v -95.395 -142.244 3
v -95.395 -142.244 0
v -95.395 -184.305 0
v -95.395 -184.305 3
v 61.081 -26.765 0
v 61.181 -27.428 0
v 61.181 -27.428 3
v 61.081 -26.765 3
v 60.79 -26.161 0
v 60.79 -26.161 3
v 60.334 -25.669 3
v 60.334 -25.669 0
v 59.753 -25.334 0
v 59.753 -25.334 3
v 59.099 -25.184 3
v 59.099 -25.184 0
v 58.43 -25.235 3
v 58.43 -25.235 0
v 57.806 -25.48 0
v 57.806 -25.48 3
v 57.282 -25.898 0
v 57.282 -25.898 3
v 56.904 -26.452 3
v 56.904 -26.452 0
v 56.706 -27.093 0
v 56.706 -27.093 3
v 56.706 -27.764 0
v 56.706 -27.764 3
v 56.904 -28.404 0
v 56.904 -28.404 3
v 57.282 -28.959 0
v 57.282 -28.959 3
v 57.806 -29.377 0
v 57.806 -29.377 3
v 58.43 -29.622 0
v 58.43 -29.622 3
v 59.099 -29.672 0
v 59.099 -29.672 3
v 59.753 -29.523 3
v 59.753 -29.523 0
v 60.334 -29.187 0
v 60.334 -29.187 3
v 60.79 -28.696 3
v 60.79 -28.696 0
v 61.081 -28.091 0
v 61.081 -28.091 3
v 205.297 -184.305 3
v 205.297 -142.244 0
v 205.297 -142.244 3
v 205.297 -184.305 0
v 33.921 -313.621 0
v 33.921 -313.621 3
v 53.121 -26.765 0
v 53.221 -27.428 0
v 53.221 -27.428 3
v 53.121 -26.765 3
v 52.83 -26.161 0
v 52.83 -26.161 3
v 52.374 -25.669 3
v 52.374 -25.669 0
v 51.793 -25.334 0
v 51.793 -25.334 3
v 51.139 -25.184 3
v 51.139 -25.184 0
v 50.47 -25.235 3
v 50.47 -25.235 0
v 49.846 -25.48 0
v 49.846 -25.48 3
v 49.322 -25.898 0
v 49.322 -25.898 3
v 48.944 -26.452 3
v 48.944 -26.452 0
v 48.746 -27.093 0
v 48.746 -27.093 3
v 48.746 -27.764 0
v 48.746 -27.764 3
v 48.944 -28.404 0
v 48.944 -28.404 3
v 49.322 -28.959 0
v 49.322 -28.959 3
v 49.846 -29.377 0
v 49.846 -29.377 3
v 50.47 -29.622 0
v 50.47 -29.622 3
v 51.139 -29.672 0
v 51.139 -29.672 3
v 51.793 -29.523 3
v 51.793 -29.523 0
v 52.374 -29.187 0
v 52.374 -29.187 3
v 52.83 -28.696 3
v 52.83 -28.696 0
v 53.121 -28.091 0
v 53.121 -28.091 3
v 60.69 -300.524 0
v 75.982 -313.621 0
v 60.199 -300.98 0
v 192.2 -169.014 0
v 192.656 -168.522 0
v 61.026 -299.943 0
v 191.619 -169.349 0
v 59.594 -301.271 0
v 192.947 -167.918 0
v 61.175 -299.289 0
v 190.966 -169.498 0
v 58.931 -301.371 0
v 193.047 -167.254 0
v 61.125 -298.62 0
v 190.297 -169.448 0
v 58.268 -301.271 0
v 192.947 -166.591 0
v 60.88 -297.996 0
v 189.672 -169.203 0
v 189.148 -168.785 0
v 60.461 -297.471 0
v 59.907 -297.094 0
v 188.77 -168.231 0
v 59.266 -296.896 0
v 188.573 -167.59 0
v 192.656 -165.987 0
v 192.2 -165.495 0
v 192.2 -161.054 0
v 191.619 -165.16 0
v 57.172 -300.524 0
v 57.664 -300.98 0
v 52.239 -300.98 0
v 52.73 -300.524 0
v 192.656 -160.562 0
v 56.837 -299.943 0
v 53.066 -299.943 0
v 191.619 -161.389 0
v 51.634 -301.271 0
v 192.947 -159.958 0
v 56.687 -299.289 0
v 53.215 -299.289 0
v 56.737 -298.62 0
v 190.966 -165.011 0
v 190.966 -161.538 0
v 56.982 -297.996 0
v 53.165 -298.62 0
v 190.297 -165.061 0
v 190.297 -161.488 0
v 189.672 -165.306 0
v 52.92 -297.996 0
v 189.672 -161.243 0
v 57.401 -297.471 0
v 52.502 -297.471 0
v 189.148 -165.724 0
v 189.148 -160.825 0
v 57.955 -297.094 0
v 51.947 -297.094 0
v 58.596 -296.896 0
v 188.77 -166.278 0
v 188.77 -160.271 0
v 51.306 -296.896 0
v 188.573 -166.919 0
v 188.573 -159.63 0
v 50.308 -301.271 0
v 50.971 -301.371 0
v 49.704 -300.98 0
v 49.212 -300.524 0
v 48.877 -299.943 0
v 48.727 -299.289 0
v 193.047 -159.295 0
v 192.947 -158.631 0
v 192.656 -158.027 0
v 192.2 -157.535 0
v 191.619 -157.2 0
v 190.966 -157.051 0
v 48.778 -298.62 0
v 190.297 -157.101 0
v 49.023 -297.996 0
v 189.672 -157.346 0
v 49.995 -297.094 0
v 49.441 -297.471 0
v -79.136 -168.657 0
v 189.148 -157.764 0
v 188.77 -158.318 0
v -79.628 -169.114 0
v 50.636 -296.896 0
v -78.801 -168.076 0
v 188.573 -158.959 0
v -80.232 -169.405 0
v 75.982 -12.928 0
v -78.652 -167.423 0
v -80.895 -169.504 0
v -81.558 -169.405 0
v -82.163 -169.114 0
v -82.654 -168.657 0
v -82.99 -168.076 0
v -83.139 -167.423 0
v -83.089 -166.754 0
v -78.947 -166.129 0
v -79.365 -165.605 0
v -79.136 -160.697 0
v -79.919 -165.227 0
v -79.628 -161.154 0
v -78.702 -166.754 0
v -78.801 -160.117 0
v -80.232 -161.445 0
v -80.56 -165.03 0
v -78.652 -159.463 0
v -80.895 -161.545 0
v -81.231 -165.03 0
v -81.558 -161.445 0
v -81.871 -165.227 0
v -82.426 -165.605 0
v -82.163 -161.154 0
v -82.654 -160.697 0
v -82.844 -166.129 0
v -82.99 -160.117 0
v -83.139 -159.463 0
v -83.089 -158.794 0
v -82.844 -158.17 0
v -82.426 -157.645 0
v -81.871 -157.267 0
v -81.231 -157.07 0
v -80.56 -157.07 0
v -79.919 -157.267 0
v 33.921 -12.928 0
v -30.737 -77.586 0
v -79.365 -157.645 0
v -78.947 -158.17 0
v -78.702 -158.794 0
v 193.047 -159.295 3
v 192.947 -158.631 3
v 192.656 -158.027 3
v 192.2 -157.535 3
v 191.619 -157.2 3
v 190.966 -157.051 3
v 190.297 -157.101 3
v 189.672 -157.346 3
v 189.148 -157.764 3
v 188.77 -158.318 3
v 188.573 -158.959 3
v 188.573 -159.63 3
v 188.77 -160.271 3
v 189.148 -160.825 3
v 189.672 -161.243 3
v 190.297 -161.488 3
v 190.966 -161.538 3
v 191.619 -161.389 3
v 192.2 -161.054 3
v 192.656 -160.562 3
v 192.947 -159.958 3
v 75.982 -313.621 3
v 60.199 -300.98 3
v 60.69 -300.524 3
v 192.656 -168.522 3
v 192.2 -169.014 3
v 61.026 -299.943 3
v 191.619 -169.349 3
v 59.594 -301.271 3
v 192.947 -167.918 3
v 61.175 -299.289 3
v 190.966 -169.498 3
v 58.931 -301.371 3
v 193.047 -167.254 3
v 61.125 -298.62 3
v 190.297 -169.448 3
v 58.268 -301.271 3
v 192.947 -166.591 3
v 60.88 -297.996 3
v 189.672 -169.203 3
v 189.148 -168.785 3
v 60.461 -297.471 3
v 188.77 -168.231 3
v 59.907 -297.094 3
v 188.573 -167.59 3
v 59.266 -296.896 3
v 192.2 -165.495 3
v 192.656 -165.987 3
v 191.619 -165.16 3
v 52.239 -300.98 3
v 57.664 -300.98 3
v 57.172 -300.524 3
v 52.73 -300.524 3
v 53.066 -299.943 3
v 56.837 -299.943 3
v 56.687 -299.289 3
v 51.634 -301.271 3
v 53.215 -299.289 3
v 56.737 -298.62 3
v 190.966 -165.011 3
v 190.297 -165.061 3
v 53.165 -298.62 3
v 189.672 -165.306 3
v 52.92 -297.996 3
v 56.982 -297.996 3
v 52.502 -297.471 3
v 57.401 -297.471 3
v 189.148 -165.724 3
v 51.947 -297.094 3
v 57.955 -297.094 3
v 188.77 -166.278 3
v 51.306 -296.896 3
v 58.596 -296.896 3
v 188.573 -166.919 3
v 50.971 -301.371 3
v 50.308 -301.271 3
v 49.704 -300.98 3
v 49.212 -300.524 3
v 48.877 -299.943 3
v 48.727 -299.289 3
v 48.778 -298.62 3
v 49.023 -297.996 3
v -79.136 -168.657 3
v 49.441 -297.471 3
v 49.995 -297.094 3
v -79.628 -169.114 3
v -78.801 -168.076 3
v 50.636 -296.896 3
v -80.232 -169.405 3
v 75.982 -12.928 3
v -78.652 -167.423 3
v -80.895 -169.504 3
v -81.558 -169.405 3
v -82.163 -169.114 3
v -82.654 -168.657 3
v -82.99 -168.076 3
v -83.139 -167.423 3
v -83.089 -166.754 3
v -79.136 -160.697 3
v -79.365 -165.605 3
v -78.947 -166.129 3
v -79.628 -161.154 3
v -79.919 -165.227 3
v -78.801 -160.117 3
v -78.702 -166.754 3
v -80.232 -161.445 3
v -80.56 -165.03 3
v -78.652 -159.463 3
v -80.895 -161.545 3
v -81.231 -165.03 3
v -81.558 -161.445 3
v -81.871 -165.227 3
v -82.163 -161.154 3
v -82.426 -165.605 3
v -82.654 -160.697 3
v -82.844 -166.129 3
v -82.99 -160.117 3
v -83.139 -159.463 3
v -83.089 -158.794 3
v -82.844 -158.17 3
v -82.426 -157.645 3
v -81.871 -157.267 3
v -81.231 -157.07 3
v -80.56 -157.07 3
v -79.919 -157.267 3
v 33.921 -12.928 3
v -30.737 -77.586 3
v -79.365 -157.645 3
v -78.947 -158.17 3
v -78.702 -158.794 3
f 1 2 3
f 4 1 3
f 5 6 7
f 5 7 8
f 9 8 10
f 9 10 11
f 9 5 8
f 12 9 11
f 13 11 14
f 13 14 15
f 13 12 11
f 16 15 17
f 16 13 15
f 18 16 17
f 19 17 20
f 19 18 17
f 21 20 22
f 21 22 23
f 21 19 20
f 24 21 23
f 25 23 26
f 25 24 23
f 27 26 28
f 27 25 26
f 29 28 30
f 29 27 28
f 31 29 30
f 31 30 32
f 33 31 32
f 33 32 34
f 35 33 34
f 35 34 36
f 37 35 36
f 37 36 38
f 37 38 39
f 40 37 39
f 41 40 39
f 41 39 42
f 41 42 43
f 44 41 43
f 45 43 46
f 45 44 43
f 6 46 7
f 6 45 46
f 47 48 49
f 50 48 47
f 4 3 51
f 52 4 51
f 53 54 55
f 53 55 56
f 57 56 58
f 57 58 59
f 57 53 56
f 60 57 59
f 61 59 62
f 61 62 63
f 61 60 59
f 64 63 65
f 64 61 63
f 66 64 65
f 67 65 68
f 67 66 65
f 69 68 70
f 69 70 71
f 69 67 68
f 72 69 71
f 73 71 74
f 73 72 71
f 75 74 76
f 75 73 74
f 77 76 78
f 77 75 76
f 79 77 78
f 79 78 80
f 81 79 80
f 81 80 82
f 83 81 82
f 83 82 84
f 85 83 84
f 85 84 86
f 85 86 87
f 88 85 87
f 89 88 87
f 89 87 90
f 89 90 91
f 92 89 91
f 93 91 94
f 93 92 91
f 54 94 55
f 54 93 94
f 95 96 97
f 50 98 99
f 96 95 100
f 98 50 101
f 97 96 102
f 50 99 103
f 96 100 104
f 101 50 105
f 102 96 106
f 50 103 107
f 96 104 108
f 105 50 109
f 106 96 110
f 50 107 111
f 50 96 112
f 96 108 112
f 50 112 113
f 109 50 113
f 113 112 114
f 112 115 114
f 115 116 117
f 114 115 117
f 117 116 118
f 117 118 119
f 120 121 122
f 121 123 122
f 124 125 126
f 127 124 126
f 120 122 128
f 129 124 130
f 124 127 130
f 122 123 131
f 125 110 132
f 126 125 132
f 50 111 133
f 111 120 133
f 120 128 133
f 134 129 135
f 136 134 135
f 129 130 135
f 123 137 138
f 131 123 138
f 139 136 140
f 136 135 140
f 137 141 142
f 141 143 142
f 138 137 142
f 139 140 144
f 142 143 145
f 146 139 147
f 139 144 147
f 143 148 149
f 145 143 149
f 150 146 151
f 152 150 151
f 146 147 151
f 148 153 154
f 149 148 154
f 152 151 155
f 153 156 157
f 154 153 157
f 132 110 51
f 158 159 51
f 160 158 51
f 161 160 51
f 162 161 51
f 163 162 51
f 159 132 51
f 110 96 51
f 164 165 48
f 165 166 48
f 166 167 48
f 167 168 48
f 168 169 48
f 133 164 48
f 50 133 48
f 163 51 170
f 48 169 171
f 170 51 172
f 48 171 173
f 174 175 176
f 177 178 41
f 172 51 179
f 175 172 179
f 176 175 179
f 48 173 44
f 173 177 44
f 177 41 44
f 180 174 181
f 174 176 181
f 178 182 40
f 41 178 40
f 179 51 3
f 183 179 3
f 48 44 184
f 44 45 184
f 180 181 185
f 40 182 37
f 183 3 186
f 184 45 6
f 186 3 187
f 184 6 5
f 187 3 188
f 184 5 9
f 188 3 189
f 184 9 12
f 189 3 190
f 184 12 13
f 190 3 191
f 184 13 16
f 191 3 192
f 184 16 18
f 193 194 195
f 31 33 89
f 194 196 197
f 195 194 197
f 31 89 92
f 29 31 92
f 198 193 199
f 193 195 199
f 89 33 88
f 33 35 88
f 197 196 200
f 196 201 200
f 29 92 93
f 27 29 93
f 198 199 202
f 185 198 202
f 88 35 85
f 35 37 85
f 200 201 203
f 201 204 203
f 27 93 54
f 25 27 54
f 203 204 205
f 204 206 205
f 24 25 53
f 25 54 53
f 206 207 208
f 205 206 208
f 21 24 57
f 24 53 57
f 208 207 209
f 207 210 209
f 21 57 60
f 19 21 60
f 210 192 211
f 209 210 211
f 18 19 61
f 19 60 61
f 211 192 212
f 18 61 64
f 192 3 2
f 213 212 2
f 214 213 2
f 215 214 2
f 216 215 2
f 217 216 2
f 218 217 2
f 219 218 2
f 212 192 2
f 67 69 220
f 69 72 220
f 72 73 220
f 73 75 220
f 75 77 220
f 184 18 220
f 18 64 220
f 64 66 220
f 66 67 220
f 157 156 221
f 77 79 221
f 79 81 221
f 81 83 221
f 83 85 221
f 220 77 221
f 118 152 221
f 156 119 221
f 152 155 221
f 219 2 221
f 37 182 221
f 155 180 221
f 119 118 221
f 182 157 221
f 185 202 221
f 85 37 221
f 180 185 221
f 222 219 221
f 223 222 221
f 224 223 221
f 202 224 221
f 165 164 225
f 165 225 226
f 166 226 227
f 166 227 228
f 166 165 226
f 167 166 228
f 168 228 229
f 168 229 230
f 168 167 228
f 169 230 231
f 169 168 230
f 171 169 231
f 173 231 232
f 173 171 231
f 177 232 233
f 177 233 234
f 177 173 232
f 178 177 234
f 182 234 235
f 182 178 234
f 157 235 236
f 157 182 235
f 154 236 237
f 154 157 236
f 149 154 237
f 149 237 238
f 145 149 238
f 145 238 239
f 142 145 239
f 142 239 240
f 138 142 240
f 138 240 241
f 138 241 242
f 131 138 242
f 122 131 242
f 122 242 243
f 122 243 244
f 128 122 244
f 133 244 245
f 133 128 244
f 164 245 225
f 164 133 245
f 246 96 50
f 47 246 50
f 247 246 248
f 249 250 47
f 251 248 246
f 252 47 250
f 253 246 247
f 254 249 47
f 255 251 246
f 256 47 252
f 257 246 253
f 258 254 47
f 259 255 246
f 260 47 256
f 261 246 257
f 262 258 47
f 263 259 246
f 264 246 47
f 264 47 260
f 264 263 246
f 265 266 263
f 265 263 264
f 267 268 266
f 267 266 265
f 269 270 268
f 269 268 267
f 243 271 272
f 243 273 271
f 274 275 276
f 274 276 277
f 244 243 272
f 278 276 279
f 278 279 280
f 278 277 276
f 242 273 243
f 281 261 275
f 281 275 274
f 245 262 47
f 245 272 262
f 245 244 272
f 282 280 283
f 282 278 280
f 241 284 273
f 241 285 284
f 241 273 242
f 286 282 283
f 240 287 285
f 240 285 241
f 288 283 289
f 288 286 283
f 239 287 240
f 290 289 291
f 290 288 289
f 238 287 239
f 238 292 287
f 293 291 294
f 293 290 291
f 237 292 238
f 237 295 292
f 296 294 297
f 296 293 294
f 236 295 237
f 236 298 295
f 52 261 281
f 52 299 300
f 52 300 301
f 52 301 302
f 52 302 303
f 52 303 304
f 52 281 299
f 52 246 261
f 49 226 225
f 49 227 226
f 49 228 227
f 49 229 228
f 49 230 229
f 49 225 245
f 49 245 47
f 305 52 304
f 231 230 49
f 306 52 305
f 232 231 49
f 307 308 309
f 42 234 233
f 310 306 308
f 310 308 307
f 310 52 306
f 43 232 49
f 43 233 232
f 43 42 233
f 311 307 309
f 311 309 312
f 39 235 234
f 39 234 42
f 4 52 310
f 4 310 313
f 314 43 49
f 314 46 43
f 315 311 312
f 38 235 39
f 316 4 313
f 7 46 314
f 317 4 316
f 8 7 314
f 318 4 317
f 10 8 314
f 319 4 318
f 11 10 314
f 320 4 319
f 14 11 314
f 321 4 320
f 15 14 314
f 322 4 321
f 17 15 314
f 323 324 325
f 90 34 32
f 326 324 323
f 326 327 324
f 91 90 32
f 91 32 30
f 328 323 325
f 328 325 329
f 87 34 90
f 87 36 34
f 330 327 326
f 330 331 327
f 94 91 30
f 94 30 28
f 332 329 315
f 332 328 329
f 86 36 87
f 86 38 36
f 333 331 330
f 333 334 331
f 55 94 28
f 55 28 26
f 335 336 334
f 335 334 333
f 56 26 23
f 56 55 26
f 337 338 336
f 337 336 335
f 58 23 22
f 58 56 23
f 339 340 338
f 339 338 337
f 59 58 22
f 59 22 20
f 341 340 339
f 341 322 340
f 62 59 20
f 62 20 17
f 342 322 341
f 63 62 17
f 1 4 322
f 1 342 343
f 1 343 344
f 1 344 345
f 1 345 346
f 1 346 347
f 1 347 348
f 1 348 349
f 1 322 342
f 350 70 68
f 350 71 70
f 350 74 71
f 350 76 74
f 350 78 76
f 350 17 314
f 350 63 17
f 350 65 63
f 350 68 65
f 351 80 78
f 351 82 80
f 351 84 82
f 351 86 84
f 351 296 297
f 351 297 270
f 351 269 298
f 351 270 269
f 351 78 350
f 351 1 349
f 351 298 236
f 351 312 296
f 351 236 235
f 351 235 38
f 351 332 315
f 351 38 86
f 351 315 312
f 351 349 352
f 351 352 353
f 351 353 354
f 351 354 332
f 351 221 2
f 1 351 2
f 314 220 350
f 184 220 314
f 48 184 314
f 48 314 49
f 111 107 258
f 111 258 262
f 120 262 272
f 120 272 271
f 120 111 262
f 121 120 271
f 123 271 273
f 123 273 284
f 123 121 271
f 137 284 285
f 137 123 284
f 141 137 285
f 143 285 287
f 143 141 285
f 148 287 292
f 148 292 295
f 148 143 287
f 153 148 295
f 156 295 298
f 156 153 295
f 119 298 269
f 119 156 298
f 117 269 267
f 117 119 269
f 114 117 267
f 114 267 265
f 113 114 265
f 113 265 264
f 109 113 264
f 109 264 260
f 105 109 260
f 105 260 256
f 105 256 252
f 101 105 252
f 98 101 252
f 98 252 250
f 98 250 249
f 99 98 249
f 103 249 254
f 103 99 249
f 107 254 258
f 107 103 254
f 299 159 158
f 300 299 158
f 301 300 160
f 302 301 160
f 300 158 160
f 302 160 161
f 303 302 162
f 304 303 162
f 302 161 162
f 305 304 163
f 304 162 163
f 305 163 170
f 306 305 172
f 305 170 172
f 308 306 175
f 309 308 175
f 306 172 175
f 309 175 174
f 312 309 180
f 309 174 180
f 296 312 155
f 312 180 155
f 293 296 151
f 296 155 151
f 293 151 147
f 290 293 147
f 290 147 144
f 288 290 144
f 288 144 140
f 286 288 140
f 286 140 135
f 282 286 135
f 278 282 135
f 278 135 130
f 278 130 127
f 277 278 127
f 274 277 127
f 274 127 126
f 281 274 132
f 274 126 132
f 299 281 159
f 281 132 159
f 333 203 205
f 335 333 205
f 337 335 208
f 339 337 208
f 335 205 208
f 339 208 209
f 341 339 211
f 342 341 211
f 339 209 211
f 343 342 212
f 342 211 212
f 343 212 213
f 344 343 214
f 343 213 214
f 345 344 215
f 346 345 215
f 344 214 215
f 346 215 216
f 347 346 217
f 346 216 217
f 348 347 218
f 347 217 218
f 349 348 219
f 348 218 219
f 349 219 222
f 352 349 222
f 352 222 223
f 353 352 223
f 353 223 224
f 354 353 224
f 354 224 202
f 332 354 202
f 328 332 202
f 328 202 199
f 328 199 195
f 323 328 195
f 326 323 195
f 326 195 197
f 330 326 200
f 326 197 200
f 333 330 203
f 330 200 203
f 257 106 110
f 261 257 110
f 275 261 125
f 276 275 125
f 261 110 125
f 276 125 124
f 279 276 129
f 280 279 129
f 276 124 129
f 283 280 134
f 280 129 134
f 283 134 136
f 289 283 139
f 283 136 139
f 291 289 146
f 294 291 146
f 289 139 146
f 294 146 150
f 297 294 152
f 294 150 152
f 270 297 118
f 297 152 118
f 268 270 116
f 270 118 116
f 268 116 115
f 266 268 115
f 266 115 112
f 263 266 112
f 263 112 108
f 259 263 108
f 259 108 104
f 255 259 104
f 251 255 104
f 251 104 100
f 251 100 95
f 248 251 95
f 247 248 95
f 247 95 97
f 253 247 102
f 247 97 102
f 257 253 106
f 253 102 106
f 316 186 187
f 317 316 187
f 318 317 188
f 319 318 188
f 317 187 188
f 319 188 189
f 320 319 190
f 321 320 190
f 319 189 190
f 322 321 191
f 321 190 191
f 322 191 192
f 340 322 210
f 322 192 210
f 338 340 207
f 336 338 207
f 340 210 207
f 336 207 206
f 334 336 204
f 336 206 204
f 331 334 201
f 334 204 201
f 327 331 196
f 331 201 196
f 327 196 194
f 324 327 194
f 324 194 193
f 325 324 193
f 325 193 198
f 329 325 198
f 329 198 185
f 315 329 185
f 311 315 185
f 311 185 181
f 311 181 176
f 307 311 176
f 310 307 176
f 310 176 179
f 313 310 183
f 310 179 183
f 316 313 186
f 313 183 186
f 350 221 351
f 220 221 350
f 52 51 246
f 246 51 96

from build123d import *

# Parameters (mm, degrees)
SKETCH2_R           = 2.25
BOSS_EXTRUDE1_DEPTH = 3


with BuildPart() as part:
    # Sketch2 → Boss-Extrude1 (new body)
    with BuildSketch(Plane(origin=(54.951104055, -12.928200351, 0), x_dir=(1, 0, 0), z_dir=(0, 0, 1))):
        Polygon((150.346314429, -129.315759544), (150.346314429, -171.376869313), (85.688434657, -236.034749085), (-85.688434657, -64.657879772), (-21.030554884, 0), (21.030554884, 0), align=None)
        with Locations((-3.979949748, -14.5)):
            Circle(SKETCH2_R, mode=Mode.SUBTRACT)
        with Locations((3.979949748, -14.5)):
            Circle(SKETCH2_R, mode=Mode.SUBTRACT)
        with Locations((135.846314429, -154.326264177)):
            Circle(SKETCH2_R, mode=Mode.SUBTRACT)
        with Locations((135.846314429, -146.36636468)):
            Circle(SKETCH2_R, mode=Mode.SUBTRACT)
    extrude(amount=BOSS_EXTRUDE1_DEPTH)

    # Mirror1: part across plane


with BuildPart() as part_1:
    add(part.part)
    add(part.part.mirror(Plane(origin=(140.639538712, -248.962949436, 3), x_dir=(0, 0, 1), z_dir=(0.707106781186551, 0.7071067811865441, 0))))


solid = part_1.part
